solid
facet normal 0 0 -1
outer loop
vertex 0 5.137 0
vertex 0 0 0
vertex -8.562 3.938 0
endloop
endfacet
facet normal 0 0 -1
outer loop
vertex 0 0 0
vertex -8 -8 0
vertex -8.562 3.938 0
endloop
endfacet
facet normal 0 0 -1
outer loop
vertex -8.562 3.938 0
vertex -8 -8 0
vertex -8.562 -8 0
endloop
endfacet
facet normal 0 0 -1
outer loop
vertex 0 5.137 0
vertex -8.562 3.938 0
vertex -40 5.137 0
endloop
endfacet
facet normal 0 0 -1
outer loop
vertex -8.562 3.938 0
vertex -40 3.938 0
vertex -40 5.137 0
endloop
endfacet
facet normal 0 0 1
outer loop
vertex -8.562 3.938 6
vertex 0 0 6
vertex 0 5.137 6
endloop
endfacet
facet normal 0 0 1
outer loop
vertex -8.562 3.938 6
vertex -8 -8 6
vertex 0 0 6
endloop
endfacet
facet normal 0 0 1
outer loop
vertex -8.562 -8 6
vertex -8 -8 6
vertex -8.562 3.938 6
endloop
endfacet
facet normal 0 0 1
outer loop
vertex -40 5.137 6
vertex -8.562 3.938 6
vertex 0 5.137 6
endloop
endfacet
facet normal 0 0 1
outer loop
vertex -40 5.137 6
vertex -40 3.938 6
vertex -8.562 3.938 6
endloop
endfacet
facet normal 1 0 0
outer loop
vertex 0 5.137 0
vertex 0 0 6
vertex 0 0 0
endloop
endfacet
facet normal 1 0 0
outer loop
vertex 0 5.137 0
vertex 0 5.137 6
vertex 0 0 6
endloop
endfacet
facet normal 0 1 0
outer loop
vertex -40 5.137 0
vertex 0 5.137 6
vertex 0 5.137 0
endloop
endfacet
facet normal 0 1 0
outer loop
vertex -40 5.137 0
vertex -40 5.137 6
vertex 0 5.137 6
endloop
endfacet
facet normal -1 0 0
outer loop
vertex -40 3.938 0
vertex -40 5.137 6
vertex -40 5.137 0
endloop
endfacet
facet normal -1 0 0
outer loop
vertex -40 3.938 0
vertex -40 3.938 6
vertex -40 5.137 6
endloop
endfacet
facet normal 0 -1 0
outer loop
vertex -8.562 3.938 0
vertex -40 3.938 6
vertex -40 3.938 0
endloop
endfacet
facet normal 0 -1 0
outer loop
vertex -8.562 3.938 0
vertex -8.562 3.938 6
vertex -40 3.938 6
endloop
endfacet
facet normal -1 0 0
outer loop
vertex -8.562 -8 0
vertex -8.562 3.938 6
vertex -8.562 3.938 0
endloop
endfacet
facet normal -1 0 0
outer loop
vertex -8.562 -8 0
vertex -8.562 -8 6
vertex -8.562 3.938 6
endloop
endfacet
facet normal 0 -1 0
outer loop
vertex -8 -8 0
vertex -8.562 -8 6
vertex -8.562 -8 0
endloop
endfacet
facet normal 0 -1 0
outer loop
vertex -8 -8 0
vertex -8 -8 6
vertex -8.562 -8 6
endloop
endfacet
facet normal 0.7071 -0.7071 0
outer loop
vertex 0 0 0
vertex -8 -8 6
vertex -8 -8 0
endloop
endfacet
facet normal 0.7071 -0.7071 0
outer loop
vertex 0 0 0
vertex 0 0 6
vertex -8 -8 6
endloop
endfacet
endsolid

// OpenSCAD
// The two base polygons of bulkhead_flange_positive, isolated so the port's primitive
// decomposition can be checked against them.
//
// Parameters are the DERIVED values for U=1.0 end_bolt 3/16in -- read off the .scad that
// tools/render_variant.py generates, not from fuselage_bulkhead.scad, whose constants are
// one hand-written configuration and disagree with the sweep.
//
// The module builds these inline rather than through a named submodule, so they are
// transcribed here. That transcription is checked when the whole module is compared; this
// file only settles whether the polygons decompose into primitives, which is the question
// the FreeCAD port needs answered.
$fa=1;
$fs=0.05;

unit_width = 100.0;
corner_radius = 10.0;
panel_thickness = 4.7625;
panel_offset = 2.5;
panel_overlap = 4.7625;
panel_tolerance = 0.1;
bulkhead_thickness = 6;
flange_thickness = 1.2;

is_cowling = false;

x_start = -panel_tolerance - panel_offset - panel_overlap - flange_thickness;
y_start = max(x_start, -8.0);              // max(x_start, -bolt_offset), bolt_offset = 8

linear_extrude(height = bulkhead_thickness, center = false, convexity = 5) {
    union() {
        if (!is_cowling) {
            polygon([
                [0, 0],
                [0, corner_radius - panel_thickness - panel_tolerance],
                [-(unit_width/2 - corner_radius), corner_radius - panel_thickness - panel_tolerance],
                [-(unit_width/2 - corner_radius), corner_radius - panel_thickness - panel_tolerance - flange_thickness],
                [x_start, corner_radius - panel_thickness - panel_tolerance - flange_thickness],
                [x_start, y_start],
                [y_start, y_start]
            ]);
        }
        polygon([
            [0, 0],
            [0, corner_radius - panel_thickness - panel_tolerance],
            [-(unit_width/2 - corner_radius), corner_radius - panel_thickness - panel_tolerance],
            [-(unit_width/2 - corner_radius), corner_radius - panel_thickness - panel_tolerance - flange_thickness],
            [0, corner_radius - panel_thickness - panel_tolerance - flange_thickness]
        ]);
    }
}
